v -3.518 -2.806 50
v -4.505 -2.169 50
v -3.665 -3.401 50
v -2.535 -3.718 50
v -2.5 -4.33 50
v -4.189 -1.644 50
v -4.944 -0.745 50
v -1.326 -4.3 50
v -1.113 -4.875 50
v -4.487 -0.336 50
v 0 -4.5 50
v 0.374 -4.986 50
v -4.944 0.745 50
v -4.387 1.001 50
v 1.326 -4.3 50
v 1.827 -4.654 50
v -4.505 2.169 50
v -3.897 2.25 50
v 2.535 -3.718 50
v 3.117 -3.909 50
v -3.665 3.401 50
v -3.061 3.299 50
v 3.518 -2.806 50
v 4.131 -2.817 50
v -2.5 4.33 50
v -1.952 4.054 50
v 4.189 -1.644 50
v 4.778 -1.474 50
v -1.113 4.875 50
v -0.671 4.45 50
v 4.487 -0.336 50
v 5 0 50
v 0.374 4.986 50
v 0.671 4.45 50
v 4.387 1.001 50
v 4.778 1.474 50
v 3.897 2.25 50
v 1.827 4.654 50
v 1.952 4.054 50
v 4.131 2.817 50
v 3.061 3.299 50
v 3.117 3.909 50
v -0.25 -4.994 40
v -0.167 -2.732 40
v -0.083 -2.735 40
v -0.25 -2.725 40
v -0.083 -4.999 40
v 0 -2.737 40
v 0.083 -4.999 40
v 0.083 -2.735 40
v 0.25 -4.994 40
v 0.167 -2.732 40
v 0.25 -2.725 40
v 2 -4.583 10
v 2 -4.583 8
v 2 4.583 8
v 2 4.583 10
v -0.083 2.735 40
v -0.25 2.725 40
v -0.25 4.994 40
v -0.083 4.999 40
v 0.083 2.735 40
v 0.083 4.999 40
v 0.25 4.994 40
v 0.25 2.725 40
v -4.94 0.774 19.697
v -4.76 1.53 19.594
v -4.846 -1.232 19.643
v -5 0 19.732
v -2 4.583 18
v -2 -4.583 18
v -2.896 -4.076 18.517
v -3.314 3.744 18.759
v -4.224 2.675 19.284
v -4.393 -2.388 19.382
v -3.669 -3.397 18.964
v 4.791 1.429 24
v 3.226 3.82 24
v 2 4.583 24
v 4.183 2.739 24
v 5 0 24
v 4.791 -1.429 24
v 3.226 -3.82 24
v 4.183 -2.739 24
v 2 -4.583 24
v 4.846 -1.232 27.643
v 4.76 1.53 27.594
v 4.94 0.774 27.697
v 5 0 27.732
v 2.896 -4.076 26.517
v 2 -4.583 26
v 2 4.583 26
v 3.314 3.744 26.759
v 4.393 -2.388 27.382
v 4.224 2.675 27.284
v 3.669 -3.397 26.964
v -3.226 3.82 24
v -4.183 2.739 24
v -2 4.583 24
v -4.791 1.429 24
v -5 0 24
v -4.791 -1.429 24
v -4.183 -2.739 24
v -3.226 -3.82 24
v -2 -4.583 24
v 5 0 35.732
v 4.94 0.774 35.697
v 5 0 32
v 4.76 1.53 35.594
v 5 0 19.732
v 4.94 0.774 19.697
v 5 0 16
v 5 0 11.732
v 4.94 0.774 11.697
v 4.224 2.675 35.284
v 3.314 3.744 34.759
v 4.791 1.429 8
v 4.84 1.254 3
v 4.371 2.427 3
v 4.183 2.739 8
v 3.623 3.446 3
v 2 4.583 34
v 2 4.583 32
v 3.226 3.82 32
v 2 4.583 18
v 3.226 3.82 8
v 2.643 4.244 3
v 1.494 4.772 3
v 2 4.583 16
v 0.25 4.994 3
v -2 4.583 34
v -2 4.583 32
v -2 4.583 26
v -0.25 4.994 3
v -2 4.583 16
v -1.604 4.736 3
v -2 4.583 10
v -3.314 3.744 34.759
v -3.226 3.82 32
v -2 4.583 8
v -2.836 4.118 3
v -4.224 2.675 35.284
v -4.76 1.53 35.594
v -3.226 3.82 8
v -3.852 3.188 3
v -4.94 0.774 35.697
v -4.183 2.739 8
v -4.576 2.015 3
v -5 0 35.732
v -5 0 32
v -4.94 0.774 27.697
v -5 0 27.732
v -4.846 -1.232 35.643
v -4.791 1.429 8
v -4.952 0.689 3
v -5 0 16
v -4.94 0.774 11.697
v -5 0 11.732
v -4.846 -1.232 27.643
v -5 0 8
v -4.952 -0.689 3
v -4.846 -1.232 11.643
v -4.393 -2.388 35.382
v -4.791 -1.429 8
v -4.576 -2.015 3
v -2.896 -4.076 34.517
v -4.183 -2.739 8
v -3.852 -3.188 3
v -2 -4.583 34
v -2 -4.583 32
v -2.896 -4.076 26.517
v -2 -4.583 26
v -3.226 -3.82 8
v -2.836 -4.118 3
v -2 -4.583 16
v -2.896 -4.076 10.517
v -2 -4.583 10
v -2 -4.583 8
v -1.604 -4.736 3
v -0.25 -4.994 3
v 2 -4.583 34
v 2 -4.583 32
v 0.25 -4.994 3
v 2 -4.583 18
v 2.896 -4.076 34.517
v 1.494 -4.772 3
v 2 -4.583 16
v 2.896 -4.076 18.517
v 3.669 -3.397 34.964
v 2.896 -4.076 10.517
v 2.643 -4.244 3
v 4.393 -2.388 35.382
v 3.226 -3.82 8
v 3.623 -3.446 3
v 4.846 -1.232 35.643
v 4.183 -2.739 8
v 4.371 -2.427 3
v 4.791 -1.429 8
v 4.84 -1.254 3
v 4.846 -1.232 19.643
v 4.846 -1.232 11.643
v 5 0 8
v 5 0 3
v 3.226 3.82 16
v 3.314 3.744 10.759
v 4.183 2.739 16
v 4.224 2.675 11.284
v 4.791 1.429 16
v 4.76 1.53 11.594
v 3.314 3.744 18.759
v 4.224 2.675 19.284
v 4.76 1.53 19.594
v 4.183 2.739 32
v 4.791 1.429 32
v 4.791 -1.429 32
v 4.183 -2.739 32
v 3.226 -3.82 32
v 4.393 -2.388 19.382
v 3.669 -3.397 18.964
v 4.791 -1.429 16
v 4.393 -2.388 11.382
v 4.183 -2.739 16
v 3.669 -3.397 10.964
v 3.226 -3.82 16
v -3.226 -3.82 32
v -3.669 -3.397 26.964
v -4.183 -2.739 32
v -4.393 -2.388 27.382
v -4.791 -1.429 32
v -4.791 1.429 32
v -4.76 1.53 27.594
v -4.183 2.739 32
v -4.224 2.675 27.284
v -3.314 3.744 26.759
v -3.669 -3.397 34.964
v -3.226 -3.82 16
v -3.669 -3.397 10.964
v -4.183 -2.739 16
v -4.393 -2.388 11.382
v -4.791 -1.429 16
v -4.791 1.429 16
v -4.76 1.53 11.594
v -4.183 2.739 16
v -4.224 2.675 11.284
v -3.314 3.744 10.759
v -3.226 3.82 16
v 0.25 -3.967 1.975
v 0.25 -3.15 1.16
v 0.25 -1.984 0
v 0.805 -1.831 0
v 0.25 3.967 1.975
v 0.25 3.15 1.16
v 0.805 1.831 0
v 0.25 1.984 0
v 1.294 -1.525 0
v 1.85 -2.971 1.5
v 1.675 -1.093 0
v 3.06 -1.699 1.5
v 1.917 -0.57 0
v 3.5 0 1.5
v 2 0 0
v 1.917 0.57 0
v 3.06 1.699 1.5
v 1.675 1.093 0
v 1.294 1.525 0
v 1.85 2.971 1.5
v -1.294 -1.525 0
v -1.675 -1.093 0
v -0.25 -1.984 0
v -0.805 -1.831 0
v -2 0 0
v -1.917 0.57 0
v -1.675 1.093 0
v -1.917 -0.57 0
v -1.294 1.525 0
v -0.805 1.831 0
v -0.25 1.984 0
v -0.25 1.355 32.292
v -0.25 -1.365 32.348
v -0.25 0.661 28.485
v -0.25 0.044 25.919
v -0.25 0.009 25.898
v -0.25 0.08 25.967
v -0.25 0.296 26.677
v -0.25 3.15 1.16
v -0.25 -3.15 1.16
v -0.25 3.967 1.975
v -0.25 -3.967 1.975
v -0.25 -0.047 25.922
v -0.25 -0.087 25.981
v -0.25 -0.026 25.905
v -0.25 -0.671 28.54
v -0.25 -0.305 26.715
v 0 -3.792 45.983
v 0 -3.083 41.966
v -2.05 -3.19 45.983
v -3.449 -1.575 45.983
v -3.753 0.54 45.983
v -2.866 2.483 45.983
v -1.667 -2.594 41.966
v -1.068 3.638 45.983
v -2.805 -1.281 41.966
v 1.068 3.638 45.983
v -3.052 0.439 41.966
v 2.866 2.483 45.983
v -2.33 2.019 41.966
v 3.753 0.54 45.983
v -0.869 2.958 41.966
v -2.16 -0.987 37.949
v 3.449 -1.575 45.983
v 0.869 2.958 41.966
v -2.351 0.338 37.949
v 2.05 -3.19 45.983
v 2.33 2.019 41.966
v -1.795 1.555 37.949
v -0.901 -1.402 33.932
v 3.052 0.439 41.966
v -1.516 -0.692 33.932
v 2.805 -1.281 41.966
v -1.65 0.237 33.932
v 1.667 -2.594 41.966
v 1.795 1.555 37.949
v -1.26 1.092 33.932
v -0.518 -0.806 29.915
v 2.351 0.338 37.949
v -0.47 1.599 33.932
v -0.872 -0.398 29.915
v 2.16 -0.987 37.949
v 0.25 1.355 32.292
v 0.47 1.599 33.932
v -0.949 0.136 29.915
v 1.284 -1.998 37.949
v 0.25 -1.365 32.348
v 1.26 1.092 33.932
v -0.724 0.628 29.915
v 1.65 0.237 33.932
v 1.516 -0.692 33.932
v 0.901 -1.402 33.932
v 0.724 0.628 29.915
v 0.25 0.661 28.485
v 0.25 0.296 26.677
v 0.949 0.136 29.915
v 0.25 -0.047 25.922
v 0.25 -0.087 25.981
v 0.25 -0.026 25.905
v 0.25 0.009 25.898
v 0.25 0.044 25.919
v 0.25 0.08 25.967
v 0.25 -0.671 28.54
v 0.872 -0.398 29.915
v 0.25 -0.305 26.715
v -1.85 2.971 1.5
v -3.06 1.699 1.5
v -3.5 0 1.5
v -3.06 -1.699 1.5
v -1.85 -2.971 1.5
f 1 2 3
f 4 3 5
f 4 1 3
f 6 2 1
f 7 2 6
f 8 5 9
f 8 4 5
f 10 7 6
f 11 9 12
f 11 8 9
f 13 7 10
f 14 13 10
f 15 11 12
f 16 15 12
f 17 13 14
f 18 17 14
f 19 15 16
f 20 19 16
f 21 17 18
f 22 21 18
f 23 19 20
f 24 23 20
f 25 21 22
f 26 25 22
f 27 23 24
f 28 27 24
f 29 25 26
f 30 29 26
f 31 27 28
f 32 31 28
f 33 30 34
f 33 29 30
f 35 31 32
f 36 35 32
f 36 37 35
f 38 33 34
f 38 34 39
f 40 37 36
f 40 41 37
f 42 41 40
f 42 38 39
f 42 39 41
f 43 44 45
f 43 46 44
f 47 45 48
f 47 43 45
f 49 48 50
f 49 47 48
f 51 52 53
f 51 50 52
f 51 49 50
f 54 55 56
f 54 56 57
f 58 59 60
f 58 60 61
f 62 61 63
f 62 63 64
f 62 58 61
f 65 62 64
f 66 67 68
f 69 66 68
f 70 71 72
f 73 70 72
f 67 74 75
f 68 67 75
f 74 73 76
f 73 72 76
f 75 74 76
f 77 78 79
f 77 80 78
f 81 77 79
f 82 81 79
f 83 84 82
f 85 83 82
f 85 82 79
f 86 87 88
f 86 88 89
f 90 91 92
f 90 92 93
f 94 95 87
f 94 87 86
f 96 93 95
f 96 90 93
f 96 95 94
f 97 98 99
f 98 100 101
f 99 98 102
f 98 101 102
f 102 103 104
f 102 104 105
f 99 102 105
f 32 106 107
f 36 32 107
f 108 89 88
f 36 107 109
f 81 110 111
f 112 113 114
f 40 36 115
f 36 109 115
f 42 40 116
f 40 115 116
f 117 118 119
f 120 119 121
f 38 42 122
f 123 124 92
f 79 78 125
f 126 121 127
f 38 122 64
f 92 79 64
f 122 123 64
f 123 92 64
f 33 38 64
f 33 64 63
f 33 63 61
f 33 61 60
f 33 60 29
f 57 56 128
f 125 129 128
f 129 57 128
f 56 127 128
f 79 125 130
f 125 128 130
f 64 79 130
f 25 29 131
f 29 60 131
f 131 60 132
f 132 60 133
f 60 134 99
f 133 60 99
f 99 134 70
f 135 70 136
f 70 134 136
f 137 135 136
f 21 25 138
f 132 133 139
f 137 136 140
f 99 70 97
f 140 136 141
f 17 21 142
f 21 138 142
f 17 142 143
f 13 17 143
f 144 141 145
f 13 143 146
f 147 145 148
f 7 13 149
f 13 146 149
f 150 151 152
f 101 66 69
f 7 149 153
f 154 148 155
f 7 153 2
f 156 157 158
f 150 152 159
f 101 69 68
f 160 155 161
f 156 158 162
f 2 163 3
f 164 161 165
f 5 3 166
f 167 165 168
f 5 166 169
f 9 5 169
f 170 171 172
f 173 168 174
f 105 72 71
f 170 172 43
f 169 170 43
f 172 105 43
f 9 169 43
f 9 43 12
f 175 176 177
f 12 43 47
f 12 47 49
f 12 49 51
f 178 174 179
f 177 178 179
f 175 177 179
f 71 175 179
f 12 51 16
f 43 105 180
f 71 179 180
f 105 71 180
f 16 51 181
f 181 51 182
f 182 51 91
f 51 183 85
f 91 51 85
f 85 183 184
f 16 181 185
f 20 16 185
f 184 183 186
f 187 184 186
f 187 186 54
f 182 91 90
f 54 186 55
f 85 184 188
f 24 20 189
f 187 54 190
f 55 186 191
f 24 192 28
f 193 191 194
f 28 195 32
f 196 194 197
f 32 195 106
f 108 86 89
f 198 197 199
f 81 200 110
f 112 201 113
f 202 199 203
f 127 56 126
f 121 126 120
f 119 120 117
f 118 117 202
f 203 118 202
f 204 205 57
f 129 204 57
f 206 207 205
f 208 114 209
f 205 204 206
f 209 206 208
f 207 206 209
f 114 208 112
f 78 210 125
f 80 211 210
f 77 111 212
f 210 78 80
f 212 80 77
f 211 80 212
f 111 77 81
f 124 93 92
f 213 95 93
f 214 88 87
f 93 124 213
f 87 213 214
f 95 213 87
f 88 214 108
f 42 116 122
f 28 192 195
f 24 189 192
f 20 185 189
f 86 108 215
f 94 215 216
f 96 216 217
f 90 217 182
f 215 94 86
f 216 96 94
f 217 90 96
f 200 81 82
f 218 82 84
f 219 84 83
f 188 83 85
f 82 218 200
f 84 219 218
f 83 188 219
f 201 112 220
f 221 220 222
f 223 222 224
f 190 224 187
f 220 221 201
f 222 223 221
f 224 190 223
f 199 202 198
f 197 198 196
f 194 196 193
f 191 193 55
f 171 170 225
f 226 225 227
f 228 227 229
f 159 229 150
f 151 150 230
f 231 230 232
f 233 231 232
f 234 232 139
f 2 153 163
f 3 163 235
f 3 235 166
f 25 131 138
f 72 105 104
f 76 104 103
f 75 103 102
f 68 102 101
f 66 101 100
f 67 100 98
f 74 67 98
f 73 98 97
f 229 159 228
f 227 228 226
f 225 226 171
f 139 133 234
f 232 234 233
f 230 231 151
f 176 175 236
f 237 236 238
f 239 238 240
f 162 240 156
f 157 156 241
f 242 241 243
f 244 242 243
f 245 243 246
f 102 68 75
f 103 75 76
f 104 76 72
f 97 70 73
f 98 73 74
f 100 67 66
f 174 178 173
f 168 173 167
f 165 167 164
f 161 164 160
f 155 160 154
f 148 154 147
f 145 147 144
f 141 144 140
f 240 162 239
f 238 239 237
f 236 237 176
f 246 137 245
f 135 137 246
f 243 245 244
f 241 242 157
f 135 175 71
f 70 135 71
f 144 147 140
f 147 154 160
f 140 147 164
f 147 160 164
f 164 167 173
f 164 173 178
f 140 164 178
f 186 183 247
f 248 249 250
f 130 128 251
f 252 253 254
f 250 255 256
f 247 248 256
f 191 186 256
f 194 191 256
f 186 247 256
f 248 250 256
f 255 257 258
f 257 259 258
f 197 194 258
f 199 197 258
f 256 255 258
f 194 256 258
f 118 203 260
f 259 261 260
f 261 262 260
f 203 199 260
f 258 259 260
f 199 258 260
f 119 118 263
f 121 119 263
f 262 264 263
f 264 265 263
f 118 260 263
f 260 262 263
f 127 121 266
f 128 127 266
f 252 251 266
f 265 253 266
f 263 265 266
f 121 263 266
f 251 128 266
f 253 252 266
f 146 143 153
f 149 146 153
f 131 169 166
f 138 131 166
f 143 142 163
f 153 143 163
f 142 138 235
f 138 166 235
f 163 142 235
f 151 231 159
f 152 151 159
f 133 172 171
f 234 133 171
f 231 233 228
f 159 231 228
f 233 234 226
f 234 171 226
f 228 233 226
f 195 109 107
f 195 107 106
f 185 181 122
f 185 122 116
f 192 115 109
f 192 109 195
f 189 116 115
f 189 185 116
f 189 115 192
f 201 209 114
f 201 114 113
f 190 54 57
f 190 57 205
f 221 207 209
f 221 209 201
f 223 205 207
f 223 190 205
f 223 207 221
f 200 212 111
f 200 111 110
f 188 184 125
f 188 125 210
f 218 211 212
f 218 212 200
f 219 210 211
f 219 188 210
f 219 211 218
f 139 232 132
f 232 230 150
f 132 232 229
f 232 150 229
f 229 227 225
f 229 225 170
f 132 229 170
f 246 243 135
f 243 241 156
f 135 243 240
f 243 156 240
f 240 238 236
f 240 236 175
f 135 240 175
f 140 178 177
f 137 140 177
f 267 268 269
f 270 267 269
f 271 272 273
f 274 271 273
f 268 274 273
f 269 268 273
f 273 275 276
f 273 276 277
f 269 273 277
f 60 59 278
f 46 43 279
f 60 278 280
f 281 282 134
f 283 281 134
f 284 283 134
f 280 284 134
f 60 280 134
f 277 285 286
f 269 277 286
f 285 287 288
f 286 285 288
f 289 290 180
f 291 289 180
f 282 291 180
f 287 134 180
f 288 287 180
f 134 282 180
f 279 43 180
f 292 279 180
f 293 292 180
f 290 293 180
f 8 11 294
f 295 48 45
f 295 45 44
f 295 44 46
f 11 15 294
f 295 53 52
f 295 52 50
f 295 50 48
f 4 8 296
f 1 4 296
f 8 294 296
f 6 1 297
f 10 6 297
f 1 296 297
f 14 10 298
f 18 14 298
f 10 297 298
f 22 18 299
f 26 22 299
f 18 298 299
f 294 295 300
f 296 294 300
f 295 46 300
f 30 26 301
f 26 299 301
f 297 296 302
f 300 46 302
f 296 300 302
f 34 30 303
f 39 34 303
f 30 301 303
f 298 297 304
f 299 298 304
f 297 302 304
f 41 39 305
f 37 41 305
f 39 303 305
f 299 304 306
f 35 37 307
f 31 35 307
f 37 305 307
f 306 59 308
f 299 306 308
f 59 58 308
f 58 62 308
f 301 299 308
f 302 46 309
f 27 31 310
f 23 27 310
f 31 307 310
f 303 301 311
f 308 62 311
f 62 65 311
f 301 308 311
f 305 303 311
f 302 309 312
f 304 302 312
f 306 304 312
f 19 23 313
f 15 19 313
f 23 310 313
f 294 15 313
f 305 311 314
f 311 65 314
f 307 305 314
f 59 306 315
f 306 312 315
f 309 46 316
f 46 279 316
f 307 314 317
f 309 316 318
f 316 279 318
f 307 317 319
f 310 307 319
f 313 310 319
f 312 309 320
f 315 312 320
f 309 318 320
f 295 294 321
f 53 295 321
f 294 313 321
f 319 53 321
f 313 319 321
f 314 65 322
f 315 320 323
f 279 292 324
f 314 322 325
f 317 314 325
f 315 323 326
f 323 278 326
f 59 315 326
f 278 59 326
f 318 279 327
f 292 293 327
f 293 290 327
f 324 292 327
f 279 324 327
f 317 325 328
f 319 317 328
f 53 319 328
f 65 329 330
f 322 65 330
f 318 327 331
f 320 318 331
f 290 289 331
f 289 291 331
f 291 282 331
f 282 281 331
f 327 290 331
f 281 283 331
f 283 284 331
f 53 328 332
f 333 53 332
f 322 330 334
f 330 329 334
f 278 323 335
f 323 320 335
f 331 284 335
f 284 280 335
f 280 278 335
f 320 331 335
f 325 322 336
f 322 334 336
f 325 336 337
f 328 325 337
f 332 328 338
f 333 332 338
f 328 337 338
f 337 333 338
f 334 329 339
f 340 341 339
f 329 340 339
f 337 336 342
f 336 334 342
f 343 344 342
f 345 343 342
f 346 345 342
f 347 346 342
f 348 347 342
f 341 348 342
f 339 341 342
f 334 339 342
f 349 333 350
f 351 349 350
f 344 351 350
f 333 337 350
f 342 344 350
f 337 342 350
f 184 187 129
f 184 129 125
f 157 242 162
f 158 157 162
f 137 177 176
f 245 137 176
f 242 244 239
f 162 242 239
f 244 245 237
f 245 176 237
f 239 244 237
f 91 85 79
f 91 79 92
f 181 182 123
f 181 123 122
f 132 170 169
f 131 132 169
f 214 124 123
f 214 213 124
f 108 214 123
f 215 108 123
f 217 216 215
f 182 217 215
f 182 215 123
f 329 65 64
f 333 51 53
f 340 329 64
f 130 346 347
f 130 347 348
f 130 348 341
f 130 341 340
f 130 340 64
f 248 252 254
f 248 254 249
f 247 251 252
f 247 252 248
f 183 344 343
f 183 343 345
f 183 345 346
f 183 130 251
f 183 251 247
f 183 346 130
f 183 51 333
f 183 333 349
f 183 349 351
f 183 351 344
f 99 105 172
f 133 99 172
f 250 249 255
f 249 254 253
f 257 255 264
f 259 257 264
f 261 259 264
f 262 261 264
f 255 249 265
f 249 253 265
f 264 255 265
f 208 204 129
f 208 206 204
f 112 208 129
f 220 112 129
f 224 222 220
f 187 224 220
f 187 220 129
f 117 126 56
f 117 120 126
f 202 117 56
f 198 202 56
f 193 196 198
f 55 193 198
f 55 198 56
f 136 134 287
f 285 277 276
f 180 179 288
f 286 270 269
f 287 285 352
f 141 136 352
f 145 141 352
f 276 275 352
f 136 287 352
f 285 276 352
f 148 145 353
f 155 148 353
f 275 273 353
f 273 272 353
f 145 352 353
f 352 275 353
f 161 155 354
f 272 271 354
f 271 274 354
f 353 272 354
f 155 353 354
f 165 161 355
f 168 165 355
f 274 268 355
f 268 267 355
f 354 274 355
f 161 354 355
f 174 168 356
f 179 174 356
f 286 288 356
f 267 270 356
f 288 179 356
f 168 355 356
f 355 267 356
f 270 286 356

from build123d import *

# Parameters (mm, degrees)
SKETCH1_R               = 5
BOSS_EXTRUDE1_DEPTH     = 50
CUT_EXTRUDE1_DEPTH      = 51.497524692
CUT_EXTRUDE1_DEPTH_BACK = 51.497524692
SKETCH2_W               = 0.5
SKETCH2_H               = 40
CHAMFER1_SIZE           = 3


with BuildPart() as part:
    # Sketch1 → Boss-Extrude1 (new body)
    with BuildSketch(Plane.XY):
        Circle(SKETCH1_R)
    extrude(amount=BOSS_EXTRUDE1_DEPTH)

    # Sketch2 → Cut-Extrude1 (cut, two sides: drawn at the far end of the back side and taken through both)
    with BuildSketch(Plane(origin=(0, 0, 0), x_dir=(1, 0, 0), z_dir=(0, 1, 0)).offset(-CUT_EXTRUDE1_DEPTH_BACK)):
        with Locations((0, -20)):
            Rectangle(SKETCH2_W, SKETCH2_H)
        Polygon((-5, -8), (-2, -8), (-2, -10), (-5, -11.732050808), align=None)
        Polygon((2, -10), (5, -11.732050808), (5, -8), (2, -8), align=None)
        Polygon((-5, -16), (-2, -16), (-2, -18), (-5, -19.732050808), align=None)
        Polygon((2, -16), (2, -18), (5, -19.732050808), (5, -16), align=None)
        Polygon((-5, -24), (-2, -24), (-2, -26), (-5, -27.732050808), align=None)
        Polygon((2, -24), (2, -26), (5, -27.732050808), (5, -24), align=None)
        Polygon((-5, -32), (-2, -32), (-2, -34), (-5, -35.732050808), align=None)
        Polygon((2, -32), (2, -34), (5, -35.732050808), (5, -32), align=None)
    extrude(amount=CUT_EXTRUDE1_DEPTH + CUT_EXTRUDE1_DEPTH_BACK, mode=Mode.SUBTRACT)

    # Chamfer1
    chamfer1_edges = [part.edges().sort_by_distance(p)[0] for p in [
        (-5, 0, 0),
        (3.622844187, -3.446012188, 0),
    ]]
    chamfer(chamfer1_edges, length=CHAMFER1_SIZE)

    # Cut-Extrude2 cone 1 section (through the dimple's axis) → Cut-Extrude2 (revolve, cut)
    with BuildSketch(Plane(origin=(0, 0, 50), x_dir=(0, -1, 0), z_dir=(1, 0, 0))):
        Polygon((0, 0), (4.5, 0), (0, 25.520768188), align=None)
    revolve(axis=Axis((0, 0, 50), (0, 0, -1)), mode=Mode.SUBTRACT)


solid = part.part
